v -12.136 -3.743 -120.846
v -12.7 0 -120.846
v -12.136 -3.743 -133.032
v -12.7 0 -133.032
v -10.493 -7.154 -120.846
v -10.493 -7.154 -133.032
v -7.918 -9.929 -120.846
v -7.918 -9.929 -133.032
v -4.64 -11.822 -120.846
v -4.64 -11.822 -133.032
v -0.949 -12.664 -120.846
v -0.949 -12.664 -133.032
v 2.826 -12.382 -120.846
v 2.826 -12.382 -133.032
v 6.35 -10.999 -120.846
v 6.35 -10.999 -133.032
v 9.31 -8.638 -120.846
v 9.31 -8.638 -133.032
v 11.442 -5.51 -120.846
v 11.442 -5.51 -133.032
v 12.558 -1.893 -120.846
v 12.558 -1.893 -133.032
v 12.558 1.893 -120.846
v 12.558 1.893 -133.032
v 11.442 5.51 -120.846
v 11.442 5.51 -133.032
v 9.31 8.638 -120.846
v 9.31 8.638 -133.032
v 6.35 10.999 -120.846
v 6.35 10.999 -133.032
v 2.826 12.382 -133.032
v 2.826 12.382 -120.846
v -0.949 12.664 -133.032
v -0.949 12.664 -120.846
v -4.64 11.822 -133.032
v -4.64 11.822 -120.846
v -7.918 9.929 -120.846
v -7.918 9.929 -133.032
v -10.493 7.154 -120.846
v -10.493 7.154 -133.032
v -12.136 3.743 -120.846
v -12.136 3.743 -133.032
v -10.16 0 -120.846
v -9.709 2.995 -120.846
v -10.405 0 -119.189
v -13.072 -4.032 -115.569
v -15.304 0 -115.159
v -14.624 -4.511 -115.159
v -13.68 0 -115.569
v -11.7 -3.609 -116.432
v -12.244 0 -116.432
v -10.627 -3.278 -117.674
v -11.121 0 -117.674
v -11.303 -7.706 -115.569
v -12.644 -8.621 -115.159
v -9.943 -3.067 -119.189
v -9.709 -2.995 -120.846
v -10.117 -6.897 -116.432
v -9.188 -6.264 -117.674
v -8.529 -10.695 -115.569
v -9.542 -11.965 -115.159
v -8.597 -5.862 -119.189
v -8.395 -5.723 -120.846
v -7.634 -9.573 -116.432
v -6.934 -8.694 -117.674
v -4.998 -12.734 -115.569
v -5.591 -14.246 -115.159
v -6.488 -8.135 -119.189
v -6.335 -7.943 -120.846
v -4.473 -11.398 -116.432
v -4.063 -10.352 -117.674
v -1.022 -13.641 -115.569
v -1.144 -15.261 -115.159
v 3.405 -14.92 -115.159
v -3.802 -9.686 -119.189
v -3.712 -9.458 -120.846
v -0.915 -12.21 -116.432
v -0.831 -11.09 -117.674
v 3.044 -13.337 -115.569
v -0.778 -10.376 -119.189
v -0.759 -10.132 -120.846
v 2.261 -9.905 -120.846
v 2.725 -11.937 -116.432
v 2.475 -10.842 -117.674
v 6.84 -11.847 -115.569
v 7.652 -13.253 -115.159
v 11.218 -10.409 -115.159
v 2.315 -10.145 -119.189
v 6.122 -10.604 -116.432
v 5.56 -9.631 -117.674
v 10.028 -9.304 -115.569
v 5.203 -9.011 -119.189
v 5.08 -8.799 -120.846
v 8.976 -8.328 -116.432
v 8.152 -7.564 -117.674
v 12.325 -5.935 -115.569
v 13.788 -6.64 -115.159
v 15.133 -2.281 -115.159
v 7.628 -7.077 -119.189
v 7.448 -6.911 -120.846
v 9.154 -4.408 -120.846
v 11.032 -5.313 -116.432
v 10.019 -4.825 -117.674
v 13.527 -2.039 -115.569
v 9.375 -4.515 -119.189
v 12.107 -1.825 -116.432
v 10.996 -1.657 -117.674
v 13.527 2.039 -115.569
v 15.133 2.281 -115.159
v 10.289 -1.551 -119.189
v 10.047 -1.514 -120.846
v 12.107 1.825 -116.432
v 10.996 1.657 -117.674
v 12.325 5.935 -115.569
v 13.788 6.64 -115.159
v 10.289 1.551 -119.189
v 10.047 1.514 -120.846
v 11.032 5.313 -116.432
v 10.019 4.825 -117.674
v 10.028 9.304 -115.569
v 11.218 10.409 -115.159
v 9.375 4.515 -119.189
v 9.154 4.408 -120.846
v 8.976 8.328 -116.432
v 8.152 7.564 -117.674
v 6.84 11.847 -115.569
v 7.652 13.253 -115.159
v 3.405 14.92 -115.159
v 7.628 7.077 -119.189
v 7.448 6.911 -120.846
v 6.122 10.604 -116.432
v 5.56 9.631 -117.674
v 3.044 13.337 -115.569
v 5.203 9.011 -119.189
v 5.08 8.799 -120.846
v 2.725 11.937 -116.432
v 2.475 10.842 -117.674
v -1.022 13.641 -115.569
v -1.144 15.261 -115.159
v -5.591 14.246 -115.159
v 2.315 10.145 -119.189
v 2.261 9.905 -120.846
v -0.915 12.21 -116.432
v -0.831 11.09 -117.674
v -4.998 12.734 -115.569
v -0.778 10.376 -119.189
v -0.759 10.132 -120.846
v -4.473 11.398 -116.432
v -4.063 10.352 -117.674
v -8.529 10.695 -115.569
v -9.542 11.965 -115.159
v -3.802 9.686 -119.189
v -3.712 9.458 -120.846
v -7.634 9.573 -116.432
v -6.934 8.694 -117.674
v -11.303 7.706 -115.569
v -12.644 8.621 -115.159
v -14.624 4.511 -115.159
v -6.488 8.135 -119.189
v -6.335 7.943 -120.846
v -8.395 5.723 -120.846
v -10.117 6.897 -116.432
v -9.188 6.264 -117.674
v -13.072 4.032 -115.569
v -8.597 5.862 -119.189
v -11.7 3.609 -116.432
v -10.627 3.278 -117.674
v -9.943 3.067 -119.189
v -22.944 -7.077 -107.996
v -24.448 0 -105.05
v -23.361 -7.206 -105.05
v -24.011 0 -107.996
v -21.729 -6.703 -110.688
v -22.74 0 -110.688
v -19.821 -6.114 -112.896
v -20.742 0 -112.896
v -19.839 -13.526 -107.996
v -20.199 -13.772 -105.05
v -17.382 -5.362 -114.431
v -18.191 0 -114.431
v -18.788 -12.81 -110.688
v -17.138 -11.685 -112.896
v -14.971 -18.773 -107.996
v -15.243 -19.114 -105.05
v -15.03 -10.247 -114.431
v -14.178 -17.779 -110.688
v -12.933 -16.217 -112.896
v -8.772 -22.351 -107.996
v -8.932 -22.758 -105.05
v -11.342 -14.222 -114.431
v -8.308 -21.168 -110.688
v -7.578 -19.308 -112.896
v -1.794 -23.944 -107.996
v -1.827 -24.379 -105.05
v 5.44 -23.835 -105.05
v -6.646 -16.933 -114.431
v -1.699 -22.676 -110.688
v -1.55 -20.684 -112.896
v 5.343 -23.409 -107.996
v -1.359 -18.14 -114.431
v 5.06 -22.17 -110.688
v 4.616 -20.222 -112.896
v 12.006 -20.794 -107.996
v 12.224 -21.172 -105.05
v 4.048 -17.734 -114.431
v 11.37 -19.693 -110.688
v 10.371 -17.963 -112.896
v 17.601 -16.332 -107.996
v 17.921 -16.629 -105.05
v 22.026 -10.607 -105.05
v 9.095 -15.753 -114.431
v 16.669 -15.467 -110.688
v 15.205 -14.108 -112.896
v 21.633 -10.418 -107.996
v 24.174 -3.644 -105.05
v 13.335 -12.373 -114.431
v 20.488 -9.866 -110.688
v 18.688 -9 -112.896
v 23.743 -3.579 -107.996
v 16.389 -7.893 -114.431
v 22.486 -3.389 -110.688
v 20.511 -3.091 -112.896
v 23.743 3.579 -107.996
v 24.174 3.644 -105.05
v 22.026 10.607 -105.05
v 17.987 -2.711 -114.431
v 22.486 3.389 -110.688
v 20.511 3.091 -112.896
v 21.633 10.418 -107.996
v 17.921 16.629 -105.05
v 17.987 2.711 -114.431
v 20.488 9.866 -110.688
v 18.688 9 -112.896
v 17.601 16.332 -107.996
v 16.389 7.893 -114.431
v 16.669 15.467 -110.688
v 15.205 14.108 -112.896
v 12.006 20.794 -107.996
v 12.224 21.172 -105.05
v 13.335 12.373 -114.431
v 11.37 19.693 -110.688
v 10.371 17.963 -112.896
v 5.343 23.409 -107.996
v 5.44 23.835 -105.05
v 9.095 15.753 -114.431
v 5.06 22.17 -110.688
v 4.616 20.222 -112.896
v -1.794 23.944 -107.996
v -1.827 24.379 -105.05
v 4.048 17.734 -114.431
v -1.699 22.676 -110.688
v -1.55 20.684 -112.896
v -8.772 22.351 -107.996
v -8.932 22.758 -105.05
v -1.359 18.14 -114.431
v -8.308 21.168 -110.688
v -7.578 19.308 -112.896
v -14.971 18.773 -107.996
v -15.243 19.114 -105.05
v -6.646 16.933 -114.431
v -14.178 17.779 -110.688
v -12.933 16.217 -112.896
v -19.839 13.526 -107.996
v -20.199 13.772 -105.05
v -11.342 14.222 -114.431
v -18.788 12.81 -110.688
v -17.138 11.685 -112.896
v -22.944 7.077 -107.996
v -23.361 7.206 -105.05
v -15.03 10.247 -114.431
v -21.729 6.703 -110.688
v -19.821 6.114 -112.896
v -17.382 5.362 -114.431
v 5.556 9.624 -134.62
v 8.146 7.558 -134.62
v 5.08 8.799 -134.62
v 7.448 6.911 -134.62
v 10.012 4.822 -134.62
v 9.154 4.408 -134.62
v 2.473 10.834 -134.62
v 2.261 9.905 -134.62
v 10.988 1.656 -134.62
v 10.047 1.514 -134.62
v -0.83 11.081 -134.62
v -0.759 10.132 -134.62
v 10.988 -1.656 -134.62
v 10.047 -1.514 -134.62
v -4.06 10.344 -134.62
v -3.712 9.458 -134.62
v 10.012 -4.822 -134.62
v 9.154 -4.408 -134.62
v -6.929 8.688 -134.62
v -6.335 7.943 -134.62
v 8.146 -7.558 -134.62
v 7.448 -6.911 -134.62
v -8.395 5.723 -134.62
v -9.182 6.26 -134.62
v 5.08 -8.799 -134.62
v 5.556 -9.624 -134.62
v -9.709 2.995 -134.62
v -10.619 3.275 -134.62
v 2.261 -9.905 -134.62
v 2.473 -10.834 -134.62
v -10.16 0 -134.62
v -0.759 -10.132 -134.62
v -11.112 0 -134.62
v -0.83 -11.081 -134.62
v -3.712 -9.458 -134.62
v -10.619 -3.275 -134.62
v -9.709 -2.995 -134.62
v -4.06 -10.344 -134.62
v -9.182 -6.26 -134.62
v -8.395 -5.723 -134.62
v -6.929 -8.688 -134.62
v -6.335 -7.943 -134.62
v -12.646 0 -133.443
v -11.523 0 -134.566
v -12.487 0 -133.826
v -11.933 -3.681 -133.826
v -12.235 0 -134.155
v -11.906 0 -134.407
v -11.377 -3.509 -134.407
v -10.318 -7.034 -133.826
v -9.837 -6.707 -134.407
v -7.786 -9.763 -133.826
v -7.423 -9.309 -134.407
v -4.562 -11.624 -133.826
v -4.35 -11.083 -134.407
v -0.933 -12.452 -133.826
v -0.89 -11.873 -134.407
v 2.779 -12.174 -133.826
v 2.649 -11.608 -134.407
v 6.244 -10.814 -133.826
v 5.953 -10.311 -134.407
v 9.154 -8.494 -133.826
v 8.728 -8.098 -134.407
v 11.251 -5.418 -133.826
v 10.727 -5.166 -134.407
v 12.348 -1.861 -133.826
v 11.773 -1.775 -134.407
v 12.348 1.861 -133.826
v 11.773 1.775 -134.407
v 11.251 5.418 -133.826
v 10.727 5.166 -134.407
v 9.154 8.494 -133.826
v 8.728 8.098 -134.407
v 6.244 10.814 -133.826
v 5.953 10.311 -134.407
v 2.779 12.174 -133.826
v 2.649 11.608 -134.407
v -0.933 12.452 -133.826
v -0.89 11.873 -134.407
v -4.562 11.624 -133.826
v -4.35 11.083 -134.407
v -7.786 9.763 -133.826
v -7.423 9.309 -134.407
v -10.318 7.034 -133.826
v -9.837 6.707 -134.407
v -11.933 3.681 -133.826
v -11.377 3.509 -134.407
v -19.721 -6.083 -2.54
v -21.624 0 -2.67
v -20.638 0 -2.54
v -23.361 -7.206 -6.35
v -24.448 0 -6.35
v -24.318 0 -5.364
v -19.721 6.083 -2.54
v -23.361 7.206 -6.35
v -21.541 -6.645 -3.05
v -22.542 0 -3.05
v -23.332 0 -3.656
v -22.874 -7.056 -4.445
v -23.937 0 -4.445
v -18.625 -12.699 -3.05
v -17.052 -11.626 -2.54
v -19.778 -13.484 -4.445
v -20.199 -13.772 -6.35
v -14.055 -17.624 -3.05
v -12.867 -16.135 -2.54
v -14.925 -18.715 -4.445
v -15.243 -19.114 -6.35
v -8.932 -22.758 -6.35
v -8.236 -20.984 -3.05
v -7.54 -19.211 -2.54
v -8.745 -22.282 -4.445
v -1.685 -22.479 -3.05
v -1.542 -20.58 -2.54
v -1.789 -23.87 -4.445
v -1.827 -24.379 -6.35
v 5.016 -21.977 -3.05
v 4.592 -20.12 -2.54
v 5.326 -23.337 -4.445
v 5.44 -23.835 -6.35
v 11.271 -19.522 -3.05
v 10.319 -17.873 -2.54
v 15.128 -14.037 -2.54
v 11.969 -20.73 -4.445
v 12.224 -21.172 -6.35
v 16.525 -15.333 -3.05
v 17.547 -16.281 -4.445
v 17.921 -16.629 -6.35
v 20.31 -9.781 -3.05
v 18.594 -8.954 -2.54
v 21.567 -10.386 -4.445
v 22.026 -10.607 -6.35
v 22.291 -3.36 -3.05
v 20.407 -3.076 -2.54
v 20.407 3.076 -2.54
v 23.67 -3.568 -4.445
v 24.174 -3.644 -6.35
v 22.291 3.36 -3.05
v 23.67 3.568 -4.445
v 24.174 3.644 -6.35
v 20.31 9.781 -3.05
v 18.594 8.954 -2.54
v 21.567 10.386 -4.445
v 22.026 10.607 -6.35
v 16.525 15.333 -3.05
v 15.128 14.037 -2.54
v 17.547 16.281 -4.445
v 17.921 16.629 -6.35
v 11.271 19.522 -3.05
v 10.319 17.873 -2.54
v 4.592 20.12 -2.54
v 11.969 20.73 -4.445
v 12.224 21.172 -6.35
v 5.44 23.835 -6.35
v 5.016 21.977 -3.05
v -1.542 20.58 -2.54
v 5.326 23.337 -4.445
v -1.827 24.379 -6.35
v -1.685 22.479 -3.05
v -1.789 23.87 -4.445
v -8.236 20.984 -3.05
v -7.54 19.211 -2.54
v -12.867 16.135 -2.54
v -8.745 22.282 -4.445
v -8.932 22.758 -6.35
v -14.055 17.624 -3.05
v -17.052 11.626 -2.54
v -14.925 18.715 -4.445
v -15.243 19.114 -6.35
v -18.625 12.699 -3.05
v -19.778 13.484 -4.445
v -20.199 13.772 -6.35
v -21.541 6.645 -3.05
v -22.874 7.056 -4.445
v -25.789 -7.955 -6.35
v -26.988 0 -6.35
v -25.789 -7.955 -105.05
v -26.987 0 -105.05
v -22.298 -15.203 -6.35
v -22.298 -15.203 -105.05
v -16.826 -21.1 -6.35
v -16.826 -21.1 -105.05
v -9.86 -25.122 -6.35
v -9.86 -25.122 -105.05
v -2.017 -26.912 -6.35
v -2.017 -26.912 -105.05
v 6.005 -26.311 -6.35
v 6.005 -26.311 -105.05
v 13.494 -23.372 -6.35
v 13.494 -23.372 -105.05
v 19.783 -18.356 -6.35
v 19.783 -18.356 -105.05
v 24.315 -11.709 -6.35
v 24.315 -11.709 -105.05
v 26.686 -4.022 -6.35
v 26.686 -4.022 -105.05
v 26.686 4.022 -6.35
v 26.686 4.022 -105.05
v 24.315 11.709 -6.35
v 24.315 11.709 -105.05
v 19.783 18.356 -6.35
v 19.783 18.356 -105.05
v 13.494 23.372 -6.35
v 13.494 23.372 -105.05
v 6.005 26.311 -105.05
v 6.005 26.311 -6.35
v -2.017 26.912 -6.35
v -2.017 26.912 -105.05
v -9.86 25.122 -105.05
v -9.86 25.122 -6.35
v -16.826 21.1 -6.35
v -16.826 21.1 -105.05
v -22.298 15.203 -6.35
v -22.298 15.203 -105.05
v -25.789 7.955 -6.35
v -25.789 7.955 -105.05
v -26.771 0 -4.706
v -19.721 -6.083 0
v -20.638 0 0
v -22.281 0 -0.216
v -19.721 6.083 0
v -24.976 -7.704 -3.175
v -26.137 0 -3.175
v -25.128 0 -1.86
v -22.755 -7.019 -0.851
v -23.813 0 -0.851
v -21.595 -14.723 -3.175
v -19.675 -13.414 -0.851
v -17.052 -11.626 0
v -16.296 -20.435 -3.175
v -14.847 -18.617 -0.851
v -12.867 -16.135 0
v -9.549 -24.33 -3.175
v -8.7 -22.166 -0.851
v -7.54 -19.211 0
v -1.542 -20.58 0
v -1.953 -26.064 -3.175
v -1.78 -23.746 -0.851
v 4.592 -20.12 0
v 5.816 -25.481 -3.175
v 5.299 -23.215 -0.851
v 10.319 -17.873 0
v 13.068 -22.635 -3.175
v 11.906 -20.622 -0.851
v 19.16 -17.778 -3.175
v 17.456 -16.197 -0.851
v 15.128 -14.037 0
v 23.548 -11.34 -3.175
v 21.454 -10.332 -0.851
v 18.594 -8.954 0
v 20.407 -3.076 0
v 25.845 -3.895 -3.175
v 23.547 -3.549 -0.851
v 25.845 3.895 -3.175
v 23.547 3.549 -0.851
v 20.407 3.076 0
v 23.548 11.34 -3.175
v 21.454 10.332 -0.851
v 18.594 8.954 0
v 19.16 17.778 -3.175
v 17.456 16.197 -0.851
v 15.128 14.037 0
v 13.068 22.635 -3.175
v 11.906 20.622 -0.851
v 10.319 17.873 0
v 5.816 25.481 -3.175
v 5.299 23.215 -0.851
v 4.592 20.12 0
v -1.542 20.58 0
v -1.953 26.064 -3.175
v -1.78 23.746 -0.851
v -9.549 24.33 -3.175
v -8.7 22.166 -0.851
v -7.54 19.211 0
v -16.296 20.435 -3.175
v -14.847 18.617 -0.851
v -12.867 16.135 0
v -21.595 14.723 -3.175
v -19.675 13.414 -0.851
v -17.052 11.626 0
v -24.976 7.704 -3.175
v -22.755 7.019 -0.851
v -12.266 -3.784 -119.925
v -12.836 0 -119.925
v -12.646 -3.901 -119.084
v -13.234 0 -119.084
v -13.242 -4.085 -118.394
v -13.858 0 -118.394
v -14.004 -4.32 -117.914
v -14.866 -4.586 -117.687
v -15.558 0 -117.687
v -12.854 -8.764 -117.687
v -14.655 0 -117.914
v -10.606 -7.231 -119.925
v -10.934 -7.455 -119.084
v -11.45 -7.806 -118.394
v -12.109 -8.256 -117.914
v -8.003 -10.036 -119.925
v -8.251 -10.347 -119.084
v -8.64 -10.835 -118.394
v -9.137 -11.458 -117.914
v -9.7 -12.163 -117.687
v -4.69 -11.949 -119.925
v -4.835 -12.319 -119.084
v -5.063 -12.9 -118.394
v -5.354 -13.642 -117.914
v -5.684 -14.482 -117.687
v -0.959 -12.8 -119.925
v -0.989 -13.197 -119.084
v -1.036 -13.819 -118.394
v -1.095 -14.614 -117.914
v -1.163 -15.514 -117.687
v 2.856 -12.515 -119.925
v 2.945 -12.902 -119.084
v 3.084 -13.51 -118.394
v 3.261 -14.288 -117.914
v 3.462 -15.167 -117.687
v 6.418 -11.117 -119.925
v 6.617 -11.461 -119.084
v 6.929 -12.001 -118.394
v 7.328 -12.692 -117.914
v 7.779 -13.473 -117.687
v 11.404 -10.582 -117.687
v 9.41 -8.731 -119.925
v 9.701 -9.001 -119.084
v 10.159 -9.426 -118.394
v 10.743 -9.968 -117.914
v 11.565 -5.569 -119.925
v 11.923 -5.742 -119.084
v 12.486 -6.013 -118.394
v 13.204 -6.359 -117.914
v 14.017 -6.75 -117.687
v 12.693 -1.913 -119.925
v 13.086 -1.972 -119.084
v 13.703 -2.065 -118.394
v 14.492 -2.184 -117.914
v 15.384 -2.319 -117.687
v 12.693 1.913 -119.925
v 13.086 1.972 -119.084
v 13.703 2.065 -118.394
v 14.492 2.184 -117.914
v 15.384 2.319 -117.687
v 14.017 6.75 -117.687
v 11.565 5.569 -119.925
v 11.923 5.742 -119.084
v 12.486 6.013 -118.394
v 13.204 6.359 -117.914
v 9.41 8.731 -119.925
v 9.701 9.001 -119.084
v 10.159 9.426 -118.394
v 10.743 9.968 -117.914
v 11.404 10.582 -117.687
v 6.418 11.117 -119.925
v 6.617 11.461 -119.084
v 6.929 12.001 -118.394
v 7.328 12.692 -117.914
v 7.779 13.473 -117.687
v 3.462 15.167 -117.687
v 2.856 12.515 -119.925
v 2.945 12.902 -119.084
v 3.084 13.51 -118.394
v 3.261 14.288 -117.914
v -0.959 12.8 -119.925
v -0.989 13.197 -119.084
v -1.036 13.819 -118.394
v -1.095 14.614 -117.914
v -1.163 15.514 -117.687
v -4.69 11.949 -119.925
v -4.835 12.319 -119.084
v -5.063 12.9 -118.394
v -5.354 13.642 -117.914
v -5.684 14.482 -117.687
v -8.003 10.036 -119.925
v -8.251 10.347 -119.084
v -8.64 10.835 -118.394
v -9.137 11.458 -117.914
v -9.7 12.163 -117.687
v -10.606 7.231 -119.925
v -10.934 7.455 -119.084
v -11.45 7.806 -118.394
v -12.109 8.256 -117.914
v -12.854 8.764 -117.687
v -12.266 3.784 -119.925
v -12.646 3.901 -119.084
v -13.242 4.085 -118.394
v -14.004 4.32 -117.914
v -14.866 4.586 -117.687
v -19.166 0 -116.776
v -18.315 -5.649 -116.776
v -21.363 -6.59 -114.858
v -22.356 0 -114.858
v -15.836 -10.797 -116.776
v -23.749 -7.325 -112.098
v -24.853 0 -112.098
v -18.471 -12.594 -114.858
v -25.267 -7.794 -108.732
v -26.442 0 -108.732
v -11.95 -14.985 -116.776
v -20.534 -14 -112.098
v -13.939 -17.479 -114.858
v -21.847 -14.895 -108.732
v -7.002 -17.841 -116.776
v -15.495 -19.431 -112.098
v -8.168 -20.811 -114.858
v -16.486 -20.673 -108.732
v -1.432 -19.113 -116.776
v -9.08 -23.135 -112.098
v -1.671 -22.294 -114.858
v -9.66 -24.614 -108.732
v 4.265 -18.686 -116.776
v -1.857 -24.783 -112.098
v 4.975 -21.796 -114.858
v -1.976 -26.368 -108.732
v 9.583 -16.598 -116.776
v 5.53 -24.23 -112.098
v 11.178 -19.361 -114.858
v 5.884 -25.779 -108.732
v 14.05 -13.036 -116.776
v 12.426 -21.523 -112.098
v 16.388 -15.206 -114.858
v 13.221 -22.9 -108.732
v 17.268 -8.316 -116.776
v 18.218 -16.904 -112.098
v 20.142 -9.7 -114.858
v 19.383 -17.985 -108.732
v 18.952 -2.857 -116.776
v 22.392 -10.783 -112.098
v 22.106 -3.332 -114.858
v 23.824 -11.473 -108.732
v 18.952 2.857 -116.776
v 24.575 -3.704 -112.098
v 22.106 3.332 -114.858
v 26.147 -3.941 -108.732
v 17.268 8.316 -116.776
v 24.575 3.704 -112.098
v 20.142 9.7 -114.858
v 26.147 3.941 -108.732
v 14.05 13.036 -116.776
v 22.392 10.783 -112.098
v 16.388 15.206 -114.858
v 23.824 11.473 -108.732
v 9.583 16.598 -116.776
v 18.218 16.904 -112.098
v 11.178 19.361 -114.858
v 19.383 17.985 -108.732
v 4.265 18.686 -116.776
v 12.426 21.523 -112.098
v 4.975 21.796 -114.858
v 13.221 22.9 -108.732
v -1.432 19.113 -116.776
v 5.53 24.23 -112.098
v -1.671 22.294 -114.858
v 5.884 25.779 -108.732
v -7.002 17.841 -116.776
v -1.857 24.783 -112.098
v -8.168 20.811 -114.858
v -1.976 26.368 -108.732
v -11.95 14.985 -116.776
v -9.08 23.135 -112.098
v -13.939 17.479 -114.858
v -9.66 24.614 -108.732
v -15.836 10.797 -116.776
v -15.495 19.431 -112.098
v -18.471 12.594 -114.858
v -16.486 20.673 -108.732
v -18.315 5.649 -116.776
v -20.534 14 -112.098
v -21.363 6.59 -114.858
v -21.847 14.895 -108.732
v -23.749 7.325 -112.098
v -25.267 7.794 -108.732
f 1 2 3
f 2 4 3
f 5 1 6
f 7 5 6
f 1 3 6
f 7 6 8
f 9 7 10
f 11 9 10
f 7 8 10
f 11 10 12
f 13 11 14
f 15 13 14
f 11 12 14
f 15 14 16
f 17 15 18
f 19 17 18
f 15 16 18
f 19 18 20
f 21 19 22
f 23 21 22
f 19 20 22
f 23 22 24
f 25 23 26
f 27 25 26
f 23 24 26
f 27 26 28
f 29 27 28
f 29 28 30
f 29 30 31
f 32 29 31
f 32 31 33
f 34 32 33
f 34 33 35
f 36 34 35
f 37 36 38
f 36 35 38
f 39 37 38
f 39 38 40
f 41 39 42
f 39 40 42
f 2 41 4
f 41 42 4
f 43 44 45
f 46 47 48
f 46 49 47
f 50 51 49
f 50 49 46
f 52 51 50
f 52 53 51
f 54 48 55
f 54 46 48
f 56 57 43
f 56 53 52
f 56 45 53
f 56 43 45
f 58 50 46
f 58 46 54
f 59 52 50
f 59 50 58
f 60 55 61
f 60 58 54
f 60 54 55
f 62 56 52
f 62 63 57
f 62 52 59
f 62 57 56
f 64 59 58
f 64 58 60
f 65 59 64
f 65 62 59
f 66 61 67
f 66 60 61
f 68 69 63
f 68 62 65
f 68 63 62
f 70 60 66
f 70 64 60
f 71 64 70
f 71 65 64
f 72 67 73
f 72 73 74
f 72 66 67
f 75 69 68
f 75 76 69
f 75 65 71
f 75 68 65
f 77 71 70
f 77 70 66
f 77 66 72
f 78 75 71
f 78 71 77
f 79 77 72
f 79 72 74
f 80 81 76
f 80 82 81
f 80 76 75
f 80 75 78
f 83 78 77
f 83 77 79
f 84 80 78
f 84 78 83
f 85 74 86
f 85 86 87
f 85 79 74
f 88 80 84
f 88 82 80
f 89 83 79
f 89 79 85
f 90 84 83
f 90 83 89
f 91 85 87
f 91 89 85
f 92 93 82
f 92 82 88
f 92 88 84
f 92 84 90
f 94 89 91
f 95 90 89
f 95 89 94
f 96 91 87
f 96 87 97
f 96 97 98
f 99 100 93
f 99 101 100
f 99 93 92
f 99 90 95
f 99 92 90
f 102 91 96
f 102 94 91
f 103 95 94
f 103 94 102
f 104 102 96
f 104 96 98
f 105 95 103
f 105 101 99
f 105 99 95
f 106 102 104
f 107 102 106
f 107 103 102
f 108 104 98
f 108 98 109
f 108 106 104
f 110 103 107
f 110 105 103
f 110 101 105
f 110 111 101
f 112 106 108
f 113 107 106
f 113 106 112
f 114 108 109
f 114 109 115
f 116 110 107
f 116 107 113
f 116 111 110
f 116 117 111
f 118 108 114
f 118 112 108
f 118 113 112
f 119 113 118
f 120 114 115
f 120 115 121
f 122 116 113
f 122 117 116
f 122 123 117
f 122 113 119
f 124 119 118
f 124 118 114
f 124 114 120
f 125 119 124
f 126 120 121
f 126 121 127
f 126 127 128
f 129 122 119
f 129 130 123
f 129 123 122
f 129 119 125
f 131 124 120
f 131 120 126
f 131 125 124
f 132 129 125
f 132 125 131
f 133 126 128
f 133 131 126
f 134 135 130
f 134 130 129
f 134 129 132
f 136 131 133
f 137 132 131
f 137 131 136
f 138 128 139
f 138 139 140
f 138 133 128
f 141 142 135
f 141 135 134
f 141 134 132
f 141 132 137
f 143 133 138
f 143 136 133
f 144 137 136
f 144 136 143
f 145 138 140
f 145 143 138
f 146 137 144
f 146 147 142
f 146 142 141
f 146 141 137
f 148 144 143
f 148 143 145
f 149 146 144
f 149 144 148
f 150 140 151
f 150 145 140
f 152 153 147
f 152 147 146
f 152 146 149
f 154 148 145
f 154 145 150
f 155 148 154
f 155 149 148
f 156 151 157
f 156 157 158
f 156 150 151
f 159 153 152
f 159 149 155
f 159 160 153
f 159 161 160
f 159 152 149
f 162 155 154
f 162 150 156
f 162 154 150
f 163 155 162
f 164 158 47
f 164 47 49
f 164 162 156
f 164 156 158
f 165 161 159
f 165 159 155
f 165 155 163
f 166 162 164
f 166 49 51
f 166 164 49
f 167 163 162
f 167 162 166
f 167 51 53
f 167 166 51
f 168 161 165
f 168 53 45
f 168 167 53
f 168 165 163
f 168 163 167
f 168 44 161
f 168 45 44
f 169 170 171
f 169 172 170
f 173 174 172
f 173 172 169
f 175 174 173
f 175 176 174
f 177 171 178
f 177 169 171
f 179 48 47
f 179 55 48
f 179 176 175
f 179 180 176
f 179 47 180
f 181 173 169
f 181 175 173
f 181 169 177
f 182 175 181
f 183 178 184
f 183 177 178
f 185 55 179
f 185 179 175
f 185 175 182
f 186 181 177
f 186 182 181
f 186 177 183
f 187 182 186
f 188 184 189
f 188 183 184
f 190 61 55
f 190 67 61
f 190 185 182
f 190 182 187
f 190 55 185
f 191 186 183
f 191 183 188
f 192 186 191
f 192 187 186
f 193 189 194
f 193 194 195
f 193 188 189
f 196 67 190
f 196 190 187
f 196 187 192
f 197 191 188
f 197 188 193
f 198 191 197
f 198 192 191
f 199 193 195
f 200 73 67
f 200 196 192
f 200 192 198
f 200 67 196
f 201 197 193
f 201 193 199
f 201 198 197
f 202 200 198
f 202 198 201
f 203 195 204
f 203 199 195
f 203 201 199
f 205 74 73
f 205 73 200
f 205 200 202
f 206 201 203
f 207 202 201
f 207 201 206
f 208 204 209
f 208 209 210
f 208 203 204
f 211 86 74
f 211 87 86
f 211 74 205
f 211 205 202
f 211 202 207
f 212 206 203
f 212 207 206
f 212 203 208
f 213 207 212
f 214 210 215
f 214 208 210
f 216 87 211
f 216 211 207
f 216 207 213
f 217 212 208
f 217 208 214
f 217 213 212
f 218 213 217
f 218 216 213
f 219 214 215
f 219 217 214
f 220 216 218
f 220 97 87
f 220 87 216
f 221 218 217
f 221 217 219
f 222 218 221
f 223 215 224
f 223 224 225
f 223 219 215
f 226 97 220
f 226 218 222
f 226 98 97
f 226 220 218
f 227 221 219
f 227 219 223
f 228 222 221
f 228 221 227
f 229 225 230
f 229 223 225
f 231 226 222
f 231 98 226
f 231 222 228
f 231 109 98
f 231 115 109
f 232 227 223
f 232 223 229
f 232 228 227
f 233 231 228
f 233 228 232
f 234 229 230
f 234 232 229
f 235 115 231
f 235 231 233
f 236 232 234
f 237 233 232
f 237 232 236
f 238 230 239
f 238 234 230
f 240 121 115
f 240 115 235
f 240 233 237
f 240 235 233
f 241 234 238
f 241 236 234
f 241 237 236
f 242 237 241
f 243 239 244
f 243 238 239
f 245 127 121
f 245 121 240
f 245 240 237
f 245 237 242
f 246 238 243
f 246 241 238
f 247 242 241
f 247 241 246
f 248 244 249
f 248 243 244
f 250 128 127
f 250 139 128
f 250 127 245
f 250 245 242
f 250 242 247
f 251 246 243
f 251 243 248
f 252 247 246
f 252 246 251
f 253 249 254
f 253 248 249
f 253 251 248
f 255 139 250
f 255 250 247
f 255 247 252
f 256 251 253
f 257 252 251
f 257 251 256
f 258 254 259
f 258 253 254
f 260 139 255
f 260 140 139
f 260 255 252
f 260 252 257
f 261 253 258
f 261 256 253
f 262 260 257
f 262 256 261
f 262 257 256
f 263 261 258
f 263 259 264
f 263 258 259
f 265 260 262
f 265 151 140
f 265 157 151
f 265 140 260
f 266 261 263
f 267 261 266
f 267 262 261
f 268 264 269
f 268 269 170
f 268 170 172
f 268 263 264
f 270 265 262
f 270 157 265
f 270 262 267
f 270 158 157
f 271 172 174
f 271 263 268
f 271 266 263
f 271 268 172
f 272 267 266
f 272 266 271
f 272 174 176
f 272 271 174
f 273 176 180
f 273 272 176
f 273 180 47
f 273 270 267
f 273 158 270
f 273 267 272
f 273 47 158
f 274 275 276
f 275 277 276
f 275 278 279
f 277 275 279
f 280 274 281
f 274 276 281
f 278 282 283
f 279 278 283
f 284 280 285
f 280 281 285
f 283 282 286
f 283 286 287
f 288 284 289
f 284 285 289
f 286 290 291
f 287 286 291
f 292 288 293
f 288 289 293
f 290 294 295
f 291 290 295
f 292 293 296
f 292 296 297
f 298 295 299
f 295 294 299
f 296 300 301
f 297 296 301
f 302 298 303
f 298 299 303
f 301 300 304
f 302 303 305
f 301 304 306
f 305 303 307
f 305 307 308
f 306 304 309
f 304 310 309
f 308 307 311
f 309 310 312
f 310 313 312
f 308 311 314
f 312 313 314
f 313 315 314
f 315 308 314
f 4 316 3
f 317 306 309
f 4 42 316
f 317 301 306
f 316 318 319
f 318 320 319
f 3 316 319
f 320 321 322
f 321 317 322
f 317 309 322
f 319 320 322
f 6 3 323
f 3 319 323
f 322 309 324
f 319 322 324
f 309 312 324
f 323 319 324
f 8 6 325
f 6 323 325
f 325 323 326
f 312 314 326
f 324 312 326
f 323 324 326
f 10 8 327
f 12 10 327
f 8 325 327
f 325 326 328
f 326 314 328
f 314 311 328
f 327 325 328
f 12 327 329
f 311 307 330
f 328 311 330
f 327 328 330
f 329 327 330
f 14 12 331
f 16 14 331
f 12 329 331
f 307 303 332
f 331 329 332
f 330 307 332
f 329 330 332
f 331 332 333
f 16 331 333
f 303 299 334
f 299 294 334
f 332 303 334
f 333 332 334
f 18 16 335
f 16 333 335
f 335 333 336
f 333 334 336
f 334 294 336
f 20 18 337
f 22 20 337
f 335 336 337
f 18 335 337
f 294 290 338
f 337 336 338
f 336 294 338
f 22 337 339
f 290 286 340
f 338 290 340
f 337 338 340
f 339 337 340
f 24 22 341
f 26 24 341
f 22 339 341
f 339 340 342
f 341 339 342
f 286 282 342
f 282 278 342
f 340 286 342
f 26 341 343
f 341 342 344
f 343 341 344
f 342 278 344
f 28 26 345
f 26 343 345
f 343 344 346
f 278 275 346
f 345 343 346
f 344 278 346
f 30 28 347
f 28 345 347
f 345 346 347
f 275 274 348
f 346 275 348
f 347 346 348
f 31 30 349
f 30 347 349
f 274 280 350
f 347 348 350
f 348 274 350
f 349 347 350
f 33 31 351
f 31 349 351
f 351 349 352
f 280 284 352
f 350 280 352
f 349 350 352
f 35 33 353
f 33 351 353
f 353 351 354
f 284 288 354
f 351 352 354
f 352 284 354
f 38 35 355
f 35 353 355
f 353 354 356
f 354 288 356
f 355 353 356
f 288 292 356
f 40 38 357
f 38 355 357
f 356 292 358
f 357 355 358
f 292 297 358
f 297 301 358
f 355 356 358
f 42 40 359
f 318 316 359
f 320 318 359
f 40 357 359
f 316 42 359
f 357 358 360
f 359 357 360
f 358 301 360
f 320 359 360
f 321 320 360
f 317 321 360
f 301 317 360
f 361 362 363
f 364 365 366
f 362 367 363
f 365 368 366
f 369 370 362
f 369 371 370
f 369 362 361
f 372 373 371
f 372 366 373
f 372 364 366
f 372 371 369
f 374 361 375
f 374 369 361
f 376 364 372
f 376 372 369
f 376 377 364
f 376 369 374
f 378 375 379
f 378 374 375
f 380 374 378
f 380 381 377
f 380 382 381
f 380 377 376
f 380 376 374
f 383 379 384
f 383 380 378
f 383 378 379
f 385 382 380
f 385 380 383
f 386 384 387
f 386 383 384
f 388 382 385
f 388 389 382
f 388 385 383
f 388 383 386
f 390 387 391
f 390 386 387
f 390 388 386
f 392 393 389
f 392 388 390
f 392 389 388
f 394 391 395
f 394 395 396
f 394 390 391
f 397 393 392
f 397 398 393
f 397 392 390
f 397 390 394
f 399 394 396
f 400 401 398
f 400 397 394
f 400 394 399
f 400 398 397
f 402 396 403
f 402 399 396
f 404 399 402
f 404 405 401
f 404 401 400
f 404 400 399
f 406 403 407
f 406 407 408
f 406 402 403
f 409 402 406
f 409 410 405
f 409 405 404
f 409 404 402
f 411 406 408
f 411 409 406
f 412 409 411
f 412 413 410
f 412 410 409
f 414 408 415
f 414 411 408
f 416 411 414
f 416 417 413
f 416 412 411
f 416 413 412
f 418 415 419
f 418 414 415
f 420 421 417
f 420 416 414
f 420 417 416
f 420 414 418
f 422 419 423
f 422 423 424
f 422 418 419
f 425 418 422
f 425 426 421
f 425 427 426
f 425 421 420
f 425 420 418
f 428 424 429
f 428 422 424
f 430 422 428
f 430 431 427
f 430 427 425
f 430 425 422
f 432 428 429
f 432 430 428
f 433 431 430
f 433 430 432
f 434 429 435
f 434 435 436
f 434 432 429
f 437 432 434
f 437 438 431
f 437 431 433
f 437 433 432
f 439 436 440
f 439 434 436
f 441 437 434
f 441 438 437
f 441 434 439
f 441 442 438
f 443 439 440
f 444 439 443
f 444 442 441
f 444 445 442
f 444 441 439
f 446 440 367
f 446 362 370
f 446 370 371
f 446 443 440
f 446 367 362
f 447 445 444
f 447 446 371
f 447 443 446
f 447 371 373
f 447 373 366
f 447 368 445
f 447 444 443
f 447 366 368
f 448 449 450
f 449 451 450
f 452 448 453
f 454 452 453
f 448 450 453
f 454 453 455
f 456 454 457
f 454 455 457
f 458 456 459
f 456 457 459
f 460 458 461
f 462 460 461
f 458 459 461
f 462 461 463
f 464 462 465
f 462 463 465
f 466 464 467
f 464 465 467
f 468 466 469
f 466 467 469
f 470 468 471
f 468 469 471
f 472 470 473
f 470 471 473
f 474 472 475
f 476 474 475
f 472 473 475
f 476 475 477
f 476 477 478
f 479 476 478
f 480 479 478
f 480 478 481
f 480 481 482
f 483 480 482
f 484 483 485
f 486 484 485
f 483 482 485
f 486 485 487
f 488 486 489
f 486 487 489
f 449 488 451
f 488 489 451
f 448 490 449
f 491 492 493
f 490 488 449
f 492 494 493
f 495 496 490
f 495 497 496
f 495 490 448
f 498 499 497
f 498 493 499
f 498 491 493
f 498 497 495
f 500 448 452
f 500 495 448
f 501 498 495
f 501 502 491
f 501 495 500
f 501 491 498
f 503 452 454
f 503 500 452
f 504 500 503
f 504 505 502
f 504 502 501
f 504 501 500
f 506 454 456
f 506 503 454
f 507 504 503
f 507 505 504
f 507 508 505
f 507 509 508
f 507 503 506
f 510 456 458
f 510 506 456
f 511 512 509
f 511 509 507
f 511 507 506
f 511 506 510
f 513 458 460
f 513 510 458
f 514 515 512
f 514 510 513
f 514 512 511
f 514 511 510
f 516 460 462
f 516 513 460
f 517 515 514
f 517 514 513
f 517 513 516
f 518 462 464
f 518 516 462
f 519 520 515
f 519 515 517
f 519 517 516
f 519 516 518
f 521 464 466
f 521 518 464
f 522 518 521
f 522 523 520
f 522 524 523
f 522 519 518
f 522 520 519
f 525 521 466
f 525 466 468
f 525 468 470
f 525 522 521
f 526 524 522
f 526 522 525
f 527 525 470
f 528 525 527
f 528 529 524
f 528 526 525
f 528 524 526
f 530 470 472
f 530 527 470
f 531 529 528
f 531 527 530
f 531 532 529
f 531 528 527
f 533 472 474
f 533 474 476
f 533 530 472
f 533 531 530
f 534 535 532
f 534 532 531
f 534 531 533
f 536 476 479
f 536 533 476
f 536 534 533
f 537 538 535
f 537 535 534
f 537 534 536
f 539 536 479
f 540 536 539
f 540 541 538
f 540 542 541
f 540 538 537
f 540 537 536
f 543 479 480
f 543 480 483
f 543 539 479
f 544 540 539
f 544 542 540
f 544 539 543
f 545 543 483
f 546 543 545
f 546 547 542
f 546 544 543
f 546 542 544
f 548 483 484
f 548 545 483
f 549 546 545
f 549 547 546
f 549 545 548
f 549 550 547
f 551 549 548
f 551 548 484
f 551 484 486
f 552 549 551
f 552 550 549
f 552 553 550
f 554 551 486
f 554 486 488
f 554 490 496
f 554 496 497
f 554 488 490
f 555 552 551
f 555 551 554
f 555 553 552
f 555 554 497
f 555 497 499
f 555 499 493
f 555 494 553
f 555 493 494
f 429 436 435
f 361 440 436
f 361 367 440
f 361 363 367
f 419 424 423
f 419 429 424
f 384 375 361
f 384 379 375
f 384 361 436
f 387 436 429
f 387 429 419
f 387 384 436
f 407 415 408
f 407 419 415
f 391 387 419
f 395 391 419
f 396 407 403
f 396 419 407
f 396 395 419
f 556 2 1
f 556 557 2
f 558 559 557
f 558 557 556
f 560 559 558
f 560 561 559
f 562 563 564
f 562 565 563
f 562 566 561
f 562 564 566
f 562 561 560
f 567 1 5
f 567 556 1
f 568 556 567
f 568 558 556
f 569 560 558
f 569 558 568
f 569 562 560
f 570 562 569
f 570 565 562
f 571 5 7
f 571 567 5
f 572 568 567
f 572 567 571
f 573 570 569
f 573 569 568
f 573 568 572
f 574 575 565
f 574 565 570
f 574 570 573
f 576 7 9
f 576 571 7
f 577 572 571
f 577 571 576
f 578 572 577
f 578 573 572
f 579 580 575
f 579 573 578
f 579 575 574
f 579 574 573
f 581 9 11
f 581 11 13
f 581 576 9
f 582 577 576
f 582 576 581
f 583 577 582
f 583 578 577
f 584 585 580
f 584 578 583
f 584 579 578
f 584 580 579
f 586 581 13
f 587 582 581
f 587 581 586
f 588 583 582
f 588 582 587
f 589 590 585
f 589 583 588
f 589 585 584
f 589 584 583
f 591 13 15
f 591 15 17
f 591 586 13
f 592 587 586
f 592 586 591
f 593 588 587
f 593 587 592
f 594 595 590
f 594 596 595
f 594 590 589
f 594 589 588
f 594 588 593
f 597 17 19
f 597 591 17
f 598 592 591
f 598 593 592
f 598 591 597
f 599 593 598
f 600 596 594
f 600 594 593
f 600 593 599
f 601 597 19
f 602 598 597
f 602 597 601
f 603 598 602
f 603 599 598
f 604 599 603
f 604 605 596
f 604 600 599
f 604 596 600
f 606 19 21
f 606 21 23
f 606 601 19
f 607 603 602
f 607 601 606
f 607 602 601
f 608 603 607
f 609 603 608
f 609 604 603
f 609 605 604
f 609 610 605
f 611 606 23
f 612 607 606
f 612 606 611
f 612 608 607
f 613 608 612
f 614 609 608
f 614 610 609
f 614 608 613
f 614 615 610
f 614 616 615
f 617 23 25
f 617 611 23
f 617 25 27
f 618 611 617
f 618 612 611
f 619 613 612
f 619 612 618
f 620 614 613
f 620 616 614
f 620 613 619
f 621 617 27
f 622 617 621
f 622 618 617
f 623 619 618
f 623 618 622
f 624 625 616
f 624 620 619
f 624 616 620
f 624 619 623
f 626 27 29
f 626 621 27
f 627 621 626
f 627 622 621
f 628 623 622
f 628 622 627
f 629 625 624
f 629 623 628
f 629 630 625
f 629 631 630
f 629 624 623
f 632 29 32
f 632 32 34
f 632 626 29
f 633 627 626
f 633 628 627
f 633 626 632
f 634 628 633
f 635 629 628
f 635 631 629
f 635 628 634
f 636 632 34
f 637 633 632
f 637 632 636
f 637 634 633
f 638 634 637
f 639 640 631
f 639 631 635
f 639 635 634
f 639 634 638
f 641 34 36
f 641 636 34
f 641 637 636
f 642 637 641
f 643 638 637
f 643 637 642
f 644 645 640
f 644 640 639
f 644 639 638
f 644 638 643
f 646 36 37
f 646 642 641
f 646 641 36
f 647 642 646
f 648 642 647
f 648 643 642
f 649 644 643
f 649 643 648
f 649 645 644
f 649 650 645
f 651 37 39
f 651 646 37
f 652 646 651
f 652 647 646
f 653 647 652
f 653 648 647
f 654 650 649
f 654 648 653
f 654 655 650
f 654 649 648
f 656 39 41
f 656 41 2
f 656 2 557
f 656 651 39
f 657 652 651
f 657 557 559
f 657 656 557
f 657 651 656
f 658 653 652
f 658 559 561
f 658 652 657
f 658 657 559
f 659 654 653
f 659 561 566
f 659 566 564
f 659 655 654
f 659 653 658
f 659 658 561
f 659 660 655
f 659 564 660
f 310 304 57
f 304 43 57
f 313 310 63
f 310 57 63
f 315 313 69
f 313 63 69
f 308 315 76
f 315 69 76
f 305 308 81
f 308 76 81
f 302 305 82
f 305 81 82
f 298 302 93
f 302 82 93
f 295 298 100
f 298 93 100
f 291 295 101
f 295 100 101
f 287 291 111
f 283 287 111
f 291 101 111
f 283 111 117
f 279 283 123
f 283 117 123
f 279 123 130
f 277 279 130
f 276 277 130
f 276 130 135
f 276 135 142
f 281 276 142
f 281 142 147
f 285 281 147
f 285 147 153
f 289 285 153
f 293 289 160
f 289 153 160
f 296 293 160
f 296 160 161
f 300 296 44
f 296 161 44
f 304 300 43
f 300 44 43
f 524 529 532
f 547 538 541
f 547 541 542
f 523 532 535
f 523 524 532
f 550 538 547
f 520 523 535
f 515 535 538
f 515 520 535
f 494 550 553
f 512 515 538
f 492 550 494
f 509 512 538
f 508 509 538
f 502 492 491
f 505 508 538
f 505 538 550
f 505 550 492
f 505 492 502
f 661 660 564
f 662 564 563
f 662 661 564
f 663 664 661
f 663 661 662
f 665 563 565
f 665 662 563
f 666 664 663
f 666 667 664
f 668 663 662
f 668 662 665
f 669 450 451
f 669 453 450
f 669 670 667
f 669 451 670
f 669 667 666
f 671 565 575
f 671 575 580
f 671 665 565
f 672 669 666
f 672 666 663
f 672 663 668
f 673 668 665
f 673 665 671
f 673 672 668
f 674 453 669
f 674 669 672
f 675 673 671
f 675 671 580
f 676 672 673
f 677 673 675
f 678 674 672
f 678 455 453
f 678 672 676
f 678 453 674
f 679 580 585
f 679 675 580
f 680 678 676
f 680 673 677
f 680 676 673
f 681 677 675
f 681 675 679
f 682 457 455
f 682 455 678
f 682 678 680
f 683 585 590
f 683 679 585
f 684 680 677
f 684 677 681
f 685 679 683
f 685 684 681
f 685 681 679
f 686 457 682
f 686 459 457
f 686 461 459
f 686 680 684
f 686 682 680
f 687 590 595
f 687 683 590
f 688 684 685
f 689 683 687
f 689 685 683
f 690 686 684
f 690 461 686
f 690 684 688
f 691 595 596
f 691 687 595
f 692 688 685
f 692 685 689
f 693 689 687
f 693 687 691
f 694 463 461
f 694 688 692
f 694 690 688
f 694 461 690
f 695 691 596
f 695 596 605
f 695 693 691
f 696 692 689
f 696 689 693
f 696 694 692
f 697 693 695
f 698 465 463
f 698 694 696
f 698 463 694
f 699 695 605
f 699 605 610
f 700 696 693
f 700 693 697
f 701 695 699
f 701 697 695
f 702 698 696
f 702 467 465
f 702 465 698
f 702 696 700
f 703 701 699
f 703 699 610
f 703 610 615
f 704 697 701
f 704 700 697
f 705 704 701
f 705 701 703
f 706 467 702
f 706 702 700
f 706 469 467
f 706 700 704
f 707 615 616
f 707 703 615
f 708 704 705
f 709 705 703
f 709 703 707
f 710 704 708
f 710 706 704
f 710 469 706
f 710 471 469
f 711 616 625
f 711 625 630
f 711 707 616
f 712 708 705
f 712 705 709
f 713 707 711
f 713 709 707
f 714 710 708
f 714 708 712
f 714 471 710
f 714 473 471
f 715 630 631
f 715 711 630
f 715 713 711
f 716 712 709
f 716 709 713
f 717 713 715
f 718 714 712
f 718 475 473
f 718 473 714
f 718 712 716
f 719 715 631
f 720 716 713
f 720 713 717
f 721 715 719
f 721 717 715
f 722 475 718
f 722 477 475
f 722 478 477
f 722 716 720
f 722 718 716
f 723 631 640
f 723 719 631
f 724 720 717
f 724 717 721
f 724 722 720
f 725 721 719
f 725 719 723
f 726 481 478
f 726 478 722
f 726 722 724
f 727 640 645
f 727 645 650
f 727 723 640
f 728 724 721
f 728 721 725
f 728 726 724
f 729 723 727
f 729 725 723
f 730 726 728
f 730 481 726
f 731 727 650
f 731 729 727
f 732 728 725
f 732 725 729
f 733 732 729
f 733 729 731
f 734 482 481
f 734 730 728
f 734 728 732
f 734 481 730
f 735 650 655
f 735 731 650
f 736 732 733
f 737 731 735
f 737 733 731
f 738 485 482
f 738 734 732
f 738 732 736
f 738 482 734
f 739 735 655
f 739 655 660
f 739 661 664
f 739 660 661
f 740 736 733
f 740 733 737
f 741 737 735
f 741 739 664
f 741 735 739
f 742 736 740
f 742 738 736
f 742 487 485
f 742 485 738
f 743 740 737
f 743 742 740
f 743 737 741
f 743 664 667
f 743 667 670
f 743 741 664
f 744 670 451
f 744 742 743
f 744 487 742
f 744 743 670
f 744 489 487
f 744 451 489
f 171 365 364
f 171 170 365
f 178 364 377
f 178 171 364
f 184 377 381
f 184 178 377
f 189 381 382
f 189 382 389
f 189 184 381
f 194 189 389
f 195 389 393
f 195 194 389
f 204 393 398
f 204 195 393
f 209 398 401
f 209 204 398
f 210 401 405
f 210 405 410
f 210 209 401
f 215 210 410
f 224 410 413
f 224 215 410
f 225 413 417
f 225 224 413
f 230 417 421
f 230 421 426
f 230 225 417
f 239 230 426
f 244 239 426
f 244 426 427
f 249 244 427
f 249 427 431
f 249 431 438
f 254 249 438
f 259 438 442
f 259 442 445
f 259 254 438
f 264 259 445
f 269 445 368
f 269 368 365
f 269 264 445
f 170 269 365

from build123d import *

# Parameters (mm, degrees)
SKETCH2_W = 2.54
SKETCH2_H = 98.700326215


with BuildPart() as part:
    # Sketch2 → Revolve2 (revolve)
    with BuildSketch(Plane(origin=(0, 0, 0), x_dir=(1, 0, 0), z_dir=(0, 1, 0)), mode=Mode.PRIVATE) as revolve2_sk:
        with BuildLine():
            Line((12.7, 120.845751779), (12.7, 133.0325))
            ThreePointArc((12.7, 133.0325), (12.235032015, 134.155032015), (11.1125, 134.62))
            Line((11.1125, 134.62), (10.16, 134.62))
            Line((10.16, 134.62), (10.16, 120.845751779))
            Line((10.16, 120.845751779), (12.7, 120.845751779))
        make_face()
        with BuildLine():
            Line((10.16, 120.845751779), (12.7, 120.845751779))
            ThreePointArc((12.7, 120.845751779), (13.52035698, 118.715897031), (15.5575, 117.686666667))
            ThreePointArc((15.5575, 117.686666667), (23.706072079, 113.56974521), (26.9875, 105.050326215))
            Line((26.9875, 105.050326215), (24.4475, 105.050326215))
            ThreePointArc((24.4475, 105.050326215), (21.822357663, 111.865861411), (15.3035, 115.159398576))
            ThreePointArc((15.3035, 115.159398576), (11.636642565, 117.012013232), (10.16, 120.845751779))
        make_face()
        with Locations((25.7175, 55.700163108)):
            Rectangle(SKETCH2_W, SKETCH2_H)
        with BuildLine():
            Line((24.4475, 6.35), (26.9875, 6.35))
            ThreePointArc((26.9875, 6.35), (25.127628061, 1.859871939), (20.6375, 0))
            Line((20.6375, 0), (0, 0))
            Line((0, 0), (0, 2.54))
            Line((0, 2.54), (20.6375, 2.54))
            ThreePointArc((20.6375, 2.54), (23.331576836, 3.655923164), (24.4475, 6.35))
        make_face()
    revolve(revolve2_sk.sketch.rotate(Axis((0, 0, -132.08), (0, 0, 1)), 180), axis=Axis((0, 0, -132.08), (0, 0, 1)))


solid = part.part
